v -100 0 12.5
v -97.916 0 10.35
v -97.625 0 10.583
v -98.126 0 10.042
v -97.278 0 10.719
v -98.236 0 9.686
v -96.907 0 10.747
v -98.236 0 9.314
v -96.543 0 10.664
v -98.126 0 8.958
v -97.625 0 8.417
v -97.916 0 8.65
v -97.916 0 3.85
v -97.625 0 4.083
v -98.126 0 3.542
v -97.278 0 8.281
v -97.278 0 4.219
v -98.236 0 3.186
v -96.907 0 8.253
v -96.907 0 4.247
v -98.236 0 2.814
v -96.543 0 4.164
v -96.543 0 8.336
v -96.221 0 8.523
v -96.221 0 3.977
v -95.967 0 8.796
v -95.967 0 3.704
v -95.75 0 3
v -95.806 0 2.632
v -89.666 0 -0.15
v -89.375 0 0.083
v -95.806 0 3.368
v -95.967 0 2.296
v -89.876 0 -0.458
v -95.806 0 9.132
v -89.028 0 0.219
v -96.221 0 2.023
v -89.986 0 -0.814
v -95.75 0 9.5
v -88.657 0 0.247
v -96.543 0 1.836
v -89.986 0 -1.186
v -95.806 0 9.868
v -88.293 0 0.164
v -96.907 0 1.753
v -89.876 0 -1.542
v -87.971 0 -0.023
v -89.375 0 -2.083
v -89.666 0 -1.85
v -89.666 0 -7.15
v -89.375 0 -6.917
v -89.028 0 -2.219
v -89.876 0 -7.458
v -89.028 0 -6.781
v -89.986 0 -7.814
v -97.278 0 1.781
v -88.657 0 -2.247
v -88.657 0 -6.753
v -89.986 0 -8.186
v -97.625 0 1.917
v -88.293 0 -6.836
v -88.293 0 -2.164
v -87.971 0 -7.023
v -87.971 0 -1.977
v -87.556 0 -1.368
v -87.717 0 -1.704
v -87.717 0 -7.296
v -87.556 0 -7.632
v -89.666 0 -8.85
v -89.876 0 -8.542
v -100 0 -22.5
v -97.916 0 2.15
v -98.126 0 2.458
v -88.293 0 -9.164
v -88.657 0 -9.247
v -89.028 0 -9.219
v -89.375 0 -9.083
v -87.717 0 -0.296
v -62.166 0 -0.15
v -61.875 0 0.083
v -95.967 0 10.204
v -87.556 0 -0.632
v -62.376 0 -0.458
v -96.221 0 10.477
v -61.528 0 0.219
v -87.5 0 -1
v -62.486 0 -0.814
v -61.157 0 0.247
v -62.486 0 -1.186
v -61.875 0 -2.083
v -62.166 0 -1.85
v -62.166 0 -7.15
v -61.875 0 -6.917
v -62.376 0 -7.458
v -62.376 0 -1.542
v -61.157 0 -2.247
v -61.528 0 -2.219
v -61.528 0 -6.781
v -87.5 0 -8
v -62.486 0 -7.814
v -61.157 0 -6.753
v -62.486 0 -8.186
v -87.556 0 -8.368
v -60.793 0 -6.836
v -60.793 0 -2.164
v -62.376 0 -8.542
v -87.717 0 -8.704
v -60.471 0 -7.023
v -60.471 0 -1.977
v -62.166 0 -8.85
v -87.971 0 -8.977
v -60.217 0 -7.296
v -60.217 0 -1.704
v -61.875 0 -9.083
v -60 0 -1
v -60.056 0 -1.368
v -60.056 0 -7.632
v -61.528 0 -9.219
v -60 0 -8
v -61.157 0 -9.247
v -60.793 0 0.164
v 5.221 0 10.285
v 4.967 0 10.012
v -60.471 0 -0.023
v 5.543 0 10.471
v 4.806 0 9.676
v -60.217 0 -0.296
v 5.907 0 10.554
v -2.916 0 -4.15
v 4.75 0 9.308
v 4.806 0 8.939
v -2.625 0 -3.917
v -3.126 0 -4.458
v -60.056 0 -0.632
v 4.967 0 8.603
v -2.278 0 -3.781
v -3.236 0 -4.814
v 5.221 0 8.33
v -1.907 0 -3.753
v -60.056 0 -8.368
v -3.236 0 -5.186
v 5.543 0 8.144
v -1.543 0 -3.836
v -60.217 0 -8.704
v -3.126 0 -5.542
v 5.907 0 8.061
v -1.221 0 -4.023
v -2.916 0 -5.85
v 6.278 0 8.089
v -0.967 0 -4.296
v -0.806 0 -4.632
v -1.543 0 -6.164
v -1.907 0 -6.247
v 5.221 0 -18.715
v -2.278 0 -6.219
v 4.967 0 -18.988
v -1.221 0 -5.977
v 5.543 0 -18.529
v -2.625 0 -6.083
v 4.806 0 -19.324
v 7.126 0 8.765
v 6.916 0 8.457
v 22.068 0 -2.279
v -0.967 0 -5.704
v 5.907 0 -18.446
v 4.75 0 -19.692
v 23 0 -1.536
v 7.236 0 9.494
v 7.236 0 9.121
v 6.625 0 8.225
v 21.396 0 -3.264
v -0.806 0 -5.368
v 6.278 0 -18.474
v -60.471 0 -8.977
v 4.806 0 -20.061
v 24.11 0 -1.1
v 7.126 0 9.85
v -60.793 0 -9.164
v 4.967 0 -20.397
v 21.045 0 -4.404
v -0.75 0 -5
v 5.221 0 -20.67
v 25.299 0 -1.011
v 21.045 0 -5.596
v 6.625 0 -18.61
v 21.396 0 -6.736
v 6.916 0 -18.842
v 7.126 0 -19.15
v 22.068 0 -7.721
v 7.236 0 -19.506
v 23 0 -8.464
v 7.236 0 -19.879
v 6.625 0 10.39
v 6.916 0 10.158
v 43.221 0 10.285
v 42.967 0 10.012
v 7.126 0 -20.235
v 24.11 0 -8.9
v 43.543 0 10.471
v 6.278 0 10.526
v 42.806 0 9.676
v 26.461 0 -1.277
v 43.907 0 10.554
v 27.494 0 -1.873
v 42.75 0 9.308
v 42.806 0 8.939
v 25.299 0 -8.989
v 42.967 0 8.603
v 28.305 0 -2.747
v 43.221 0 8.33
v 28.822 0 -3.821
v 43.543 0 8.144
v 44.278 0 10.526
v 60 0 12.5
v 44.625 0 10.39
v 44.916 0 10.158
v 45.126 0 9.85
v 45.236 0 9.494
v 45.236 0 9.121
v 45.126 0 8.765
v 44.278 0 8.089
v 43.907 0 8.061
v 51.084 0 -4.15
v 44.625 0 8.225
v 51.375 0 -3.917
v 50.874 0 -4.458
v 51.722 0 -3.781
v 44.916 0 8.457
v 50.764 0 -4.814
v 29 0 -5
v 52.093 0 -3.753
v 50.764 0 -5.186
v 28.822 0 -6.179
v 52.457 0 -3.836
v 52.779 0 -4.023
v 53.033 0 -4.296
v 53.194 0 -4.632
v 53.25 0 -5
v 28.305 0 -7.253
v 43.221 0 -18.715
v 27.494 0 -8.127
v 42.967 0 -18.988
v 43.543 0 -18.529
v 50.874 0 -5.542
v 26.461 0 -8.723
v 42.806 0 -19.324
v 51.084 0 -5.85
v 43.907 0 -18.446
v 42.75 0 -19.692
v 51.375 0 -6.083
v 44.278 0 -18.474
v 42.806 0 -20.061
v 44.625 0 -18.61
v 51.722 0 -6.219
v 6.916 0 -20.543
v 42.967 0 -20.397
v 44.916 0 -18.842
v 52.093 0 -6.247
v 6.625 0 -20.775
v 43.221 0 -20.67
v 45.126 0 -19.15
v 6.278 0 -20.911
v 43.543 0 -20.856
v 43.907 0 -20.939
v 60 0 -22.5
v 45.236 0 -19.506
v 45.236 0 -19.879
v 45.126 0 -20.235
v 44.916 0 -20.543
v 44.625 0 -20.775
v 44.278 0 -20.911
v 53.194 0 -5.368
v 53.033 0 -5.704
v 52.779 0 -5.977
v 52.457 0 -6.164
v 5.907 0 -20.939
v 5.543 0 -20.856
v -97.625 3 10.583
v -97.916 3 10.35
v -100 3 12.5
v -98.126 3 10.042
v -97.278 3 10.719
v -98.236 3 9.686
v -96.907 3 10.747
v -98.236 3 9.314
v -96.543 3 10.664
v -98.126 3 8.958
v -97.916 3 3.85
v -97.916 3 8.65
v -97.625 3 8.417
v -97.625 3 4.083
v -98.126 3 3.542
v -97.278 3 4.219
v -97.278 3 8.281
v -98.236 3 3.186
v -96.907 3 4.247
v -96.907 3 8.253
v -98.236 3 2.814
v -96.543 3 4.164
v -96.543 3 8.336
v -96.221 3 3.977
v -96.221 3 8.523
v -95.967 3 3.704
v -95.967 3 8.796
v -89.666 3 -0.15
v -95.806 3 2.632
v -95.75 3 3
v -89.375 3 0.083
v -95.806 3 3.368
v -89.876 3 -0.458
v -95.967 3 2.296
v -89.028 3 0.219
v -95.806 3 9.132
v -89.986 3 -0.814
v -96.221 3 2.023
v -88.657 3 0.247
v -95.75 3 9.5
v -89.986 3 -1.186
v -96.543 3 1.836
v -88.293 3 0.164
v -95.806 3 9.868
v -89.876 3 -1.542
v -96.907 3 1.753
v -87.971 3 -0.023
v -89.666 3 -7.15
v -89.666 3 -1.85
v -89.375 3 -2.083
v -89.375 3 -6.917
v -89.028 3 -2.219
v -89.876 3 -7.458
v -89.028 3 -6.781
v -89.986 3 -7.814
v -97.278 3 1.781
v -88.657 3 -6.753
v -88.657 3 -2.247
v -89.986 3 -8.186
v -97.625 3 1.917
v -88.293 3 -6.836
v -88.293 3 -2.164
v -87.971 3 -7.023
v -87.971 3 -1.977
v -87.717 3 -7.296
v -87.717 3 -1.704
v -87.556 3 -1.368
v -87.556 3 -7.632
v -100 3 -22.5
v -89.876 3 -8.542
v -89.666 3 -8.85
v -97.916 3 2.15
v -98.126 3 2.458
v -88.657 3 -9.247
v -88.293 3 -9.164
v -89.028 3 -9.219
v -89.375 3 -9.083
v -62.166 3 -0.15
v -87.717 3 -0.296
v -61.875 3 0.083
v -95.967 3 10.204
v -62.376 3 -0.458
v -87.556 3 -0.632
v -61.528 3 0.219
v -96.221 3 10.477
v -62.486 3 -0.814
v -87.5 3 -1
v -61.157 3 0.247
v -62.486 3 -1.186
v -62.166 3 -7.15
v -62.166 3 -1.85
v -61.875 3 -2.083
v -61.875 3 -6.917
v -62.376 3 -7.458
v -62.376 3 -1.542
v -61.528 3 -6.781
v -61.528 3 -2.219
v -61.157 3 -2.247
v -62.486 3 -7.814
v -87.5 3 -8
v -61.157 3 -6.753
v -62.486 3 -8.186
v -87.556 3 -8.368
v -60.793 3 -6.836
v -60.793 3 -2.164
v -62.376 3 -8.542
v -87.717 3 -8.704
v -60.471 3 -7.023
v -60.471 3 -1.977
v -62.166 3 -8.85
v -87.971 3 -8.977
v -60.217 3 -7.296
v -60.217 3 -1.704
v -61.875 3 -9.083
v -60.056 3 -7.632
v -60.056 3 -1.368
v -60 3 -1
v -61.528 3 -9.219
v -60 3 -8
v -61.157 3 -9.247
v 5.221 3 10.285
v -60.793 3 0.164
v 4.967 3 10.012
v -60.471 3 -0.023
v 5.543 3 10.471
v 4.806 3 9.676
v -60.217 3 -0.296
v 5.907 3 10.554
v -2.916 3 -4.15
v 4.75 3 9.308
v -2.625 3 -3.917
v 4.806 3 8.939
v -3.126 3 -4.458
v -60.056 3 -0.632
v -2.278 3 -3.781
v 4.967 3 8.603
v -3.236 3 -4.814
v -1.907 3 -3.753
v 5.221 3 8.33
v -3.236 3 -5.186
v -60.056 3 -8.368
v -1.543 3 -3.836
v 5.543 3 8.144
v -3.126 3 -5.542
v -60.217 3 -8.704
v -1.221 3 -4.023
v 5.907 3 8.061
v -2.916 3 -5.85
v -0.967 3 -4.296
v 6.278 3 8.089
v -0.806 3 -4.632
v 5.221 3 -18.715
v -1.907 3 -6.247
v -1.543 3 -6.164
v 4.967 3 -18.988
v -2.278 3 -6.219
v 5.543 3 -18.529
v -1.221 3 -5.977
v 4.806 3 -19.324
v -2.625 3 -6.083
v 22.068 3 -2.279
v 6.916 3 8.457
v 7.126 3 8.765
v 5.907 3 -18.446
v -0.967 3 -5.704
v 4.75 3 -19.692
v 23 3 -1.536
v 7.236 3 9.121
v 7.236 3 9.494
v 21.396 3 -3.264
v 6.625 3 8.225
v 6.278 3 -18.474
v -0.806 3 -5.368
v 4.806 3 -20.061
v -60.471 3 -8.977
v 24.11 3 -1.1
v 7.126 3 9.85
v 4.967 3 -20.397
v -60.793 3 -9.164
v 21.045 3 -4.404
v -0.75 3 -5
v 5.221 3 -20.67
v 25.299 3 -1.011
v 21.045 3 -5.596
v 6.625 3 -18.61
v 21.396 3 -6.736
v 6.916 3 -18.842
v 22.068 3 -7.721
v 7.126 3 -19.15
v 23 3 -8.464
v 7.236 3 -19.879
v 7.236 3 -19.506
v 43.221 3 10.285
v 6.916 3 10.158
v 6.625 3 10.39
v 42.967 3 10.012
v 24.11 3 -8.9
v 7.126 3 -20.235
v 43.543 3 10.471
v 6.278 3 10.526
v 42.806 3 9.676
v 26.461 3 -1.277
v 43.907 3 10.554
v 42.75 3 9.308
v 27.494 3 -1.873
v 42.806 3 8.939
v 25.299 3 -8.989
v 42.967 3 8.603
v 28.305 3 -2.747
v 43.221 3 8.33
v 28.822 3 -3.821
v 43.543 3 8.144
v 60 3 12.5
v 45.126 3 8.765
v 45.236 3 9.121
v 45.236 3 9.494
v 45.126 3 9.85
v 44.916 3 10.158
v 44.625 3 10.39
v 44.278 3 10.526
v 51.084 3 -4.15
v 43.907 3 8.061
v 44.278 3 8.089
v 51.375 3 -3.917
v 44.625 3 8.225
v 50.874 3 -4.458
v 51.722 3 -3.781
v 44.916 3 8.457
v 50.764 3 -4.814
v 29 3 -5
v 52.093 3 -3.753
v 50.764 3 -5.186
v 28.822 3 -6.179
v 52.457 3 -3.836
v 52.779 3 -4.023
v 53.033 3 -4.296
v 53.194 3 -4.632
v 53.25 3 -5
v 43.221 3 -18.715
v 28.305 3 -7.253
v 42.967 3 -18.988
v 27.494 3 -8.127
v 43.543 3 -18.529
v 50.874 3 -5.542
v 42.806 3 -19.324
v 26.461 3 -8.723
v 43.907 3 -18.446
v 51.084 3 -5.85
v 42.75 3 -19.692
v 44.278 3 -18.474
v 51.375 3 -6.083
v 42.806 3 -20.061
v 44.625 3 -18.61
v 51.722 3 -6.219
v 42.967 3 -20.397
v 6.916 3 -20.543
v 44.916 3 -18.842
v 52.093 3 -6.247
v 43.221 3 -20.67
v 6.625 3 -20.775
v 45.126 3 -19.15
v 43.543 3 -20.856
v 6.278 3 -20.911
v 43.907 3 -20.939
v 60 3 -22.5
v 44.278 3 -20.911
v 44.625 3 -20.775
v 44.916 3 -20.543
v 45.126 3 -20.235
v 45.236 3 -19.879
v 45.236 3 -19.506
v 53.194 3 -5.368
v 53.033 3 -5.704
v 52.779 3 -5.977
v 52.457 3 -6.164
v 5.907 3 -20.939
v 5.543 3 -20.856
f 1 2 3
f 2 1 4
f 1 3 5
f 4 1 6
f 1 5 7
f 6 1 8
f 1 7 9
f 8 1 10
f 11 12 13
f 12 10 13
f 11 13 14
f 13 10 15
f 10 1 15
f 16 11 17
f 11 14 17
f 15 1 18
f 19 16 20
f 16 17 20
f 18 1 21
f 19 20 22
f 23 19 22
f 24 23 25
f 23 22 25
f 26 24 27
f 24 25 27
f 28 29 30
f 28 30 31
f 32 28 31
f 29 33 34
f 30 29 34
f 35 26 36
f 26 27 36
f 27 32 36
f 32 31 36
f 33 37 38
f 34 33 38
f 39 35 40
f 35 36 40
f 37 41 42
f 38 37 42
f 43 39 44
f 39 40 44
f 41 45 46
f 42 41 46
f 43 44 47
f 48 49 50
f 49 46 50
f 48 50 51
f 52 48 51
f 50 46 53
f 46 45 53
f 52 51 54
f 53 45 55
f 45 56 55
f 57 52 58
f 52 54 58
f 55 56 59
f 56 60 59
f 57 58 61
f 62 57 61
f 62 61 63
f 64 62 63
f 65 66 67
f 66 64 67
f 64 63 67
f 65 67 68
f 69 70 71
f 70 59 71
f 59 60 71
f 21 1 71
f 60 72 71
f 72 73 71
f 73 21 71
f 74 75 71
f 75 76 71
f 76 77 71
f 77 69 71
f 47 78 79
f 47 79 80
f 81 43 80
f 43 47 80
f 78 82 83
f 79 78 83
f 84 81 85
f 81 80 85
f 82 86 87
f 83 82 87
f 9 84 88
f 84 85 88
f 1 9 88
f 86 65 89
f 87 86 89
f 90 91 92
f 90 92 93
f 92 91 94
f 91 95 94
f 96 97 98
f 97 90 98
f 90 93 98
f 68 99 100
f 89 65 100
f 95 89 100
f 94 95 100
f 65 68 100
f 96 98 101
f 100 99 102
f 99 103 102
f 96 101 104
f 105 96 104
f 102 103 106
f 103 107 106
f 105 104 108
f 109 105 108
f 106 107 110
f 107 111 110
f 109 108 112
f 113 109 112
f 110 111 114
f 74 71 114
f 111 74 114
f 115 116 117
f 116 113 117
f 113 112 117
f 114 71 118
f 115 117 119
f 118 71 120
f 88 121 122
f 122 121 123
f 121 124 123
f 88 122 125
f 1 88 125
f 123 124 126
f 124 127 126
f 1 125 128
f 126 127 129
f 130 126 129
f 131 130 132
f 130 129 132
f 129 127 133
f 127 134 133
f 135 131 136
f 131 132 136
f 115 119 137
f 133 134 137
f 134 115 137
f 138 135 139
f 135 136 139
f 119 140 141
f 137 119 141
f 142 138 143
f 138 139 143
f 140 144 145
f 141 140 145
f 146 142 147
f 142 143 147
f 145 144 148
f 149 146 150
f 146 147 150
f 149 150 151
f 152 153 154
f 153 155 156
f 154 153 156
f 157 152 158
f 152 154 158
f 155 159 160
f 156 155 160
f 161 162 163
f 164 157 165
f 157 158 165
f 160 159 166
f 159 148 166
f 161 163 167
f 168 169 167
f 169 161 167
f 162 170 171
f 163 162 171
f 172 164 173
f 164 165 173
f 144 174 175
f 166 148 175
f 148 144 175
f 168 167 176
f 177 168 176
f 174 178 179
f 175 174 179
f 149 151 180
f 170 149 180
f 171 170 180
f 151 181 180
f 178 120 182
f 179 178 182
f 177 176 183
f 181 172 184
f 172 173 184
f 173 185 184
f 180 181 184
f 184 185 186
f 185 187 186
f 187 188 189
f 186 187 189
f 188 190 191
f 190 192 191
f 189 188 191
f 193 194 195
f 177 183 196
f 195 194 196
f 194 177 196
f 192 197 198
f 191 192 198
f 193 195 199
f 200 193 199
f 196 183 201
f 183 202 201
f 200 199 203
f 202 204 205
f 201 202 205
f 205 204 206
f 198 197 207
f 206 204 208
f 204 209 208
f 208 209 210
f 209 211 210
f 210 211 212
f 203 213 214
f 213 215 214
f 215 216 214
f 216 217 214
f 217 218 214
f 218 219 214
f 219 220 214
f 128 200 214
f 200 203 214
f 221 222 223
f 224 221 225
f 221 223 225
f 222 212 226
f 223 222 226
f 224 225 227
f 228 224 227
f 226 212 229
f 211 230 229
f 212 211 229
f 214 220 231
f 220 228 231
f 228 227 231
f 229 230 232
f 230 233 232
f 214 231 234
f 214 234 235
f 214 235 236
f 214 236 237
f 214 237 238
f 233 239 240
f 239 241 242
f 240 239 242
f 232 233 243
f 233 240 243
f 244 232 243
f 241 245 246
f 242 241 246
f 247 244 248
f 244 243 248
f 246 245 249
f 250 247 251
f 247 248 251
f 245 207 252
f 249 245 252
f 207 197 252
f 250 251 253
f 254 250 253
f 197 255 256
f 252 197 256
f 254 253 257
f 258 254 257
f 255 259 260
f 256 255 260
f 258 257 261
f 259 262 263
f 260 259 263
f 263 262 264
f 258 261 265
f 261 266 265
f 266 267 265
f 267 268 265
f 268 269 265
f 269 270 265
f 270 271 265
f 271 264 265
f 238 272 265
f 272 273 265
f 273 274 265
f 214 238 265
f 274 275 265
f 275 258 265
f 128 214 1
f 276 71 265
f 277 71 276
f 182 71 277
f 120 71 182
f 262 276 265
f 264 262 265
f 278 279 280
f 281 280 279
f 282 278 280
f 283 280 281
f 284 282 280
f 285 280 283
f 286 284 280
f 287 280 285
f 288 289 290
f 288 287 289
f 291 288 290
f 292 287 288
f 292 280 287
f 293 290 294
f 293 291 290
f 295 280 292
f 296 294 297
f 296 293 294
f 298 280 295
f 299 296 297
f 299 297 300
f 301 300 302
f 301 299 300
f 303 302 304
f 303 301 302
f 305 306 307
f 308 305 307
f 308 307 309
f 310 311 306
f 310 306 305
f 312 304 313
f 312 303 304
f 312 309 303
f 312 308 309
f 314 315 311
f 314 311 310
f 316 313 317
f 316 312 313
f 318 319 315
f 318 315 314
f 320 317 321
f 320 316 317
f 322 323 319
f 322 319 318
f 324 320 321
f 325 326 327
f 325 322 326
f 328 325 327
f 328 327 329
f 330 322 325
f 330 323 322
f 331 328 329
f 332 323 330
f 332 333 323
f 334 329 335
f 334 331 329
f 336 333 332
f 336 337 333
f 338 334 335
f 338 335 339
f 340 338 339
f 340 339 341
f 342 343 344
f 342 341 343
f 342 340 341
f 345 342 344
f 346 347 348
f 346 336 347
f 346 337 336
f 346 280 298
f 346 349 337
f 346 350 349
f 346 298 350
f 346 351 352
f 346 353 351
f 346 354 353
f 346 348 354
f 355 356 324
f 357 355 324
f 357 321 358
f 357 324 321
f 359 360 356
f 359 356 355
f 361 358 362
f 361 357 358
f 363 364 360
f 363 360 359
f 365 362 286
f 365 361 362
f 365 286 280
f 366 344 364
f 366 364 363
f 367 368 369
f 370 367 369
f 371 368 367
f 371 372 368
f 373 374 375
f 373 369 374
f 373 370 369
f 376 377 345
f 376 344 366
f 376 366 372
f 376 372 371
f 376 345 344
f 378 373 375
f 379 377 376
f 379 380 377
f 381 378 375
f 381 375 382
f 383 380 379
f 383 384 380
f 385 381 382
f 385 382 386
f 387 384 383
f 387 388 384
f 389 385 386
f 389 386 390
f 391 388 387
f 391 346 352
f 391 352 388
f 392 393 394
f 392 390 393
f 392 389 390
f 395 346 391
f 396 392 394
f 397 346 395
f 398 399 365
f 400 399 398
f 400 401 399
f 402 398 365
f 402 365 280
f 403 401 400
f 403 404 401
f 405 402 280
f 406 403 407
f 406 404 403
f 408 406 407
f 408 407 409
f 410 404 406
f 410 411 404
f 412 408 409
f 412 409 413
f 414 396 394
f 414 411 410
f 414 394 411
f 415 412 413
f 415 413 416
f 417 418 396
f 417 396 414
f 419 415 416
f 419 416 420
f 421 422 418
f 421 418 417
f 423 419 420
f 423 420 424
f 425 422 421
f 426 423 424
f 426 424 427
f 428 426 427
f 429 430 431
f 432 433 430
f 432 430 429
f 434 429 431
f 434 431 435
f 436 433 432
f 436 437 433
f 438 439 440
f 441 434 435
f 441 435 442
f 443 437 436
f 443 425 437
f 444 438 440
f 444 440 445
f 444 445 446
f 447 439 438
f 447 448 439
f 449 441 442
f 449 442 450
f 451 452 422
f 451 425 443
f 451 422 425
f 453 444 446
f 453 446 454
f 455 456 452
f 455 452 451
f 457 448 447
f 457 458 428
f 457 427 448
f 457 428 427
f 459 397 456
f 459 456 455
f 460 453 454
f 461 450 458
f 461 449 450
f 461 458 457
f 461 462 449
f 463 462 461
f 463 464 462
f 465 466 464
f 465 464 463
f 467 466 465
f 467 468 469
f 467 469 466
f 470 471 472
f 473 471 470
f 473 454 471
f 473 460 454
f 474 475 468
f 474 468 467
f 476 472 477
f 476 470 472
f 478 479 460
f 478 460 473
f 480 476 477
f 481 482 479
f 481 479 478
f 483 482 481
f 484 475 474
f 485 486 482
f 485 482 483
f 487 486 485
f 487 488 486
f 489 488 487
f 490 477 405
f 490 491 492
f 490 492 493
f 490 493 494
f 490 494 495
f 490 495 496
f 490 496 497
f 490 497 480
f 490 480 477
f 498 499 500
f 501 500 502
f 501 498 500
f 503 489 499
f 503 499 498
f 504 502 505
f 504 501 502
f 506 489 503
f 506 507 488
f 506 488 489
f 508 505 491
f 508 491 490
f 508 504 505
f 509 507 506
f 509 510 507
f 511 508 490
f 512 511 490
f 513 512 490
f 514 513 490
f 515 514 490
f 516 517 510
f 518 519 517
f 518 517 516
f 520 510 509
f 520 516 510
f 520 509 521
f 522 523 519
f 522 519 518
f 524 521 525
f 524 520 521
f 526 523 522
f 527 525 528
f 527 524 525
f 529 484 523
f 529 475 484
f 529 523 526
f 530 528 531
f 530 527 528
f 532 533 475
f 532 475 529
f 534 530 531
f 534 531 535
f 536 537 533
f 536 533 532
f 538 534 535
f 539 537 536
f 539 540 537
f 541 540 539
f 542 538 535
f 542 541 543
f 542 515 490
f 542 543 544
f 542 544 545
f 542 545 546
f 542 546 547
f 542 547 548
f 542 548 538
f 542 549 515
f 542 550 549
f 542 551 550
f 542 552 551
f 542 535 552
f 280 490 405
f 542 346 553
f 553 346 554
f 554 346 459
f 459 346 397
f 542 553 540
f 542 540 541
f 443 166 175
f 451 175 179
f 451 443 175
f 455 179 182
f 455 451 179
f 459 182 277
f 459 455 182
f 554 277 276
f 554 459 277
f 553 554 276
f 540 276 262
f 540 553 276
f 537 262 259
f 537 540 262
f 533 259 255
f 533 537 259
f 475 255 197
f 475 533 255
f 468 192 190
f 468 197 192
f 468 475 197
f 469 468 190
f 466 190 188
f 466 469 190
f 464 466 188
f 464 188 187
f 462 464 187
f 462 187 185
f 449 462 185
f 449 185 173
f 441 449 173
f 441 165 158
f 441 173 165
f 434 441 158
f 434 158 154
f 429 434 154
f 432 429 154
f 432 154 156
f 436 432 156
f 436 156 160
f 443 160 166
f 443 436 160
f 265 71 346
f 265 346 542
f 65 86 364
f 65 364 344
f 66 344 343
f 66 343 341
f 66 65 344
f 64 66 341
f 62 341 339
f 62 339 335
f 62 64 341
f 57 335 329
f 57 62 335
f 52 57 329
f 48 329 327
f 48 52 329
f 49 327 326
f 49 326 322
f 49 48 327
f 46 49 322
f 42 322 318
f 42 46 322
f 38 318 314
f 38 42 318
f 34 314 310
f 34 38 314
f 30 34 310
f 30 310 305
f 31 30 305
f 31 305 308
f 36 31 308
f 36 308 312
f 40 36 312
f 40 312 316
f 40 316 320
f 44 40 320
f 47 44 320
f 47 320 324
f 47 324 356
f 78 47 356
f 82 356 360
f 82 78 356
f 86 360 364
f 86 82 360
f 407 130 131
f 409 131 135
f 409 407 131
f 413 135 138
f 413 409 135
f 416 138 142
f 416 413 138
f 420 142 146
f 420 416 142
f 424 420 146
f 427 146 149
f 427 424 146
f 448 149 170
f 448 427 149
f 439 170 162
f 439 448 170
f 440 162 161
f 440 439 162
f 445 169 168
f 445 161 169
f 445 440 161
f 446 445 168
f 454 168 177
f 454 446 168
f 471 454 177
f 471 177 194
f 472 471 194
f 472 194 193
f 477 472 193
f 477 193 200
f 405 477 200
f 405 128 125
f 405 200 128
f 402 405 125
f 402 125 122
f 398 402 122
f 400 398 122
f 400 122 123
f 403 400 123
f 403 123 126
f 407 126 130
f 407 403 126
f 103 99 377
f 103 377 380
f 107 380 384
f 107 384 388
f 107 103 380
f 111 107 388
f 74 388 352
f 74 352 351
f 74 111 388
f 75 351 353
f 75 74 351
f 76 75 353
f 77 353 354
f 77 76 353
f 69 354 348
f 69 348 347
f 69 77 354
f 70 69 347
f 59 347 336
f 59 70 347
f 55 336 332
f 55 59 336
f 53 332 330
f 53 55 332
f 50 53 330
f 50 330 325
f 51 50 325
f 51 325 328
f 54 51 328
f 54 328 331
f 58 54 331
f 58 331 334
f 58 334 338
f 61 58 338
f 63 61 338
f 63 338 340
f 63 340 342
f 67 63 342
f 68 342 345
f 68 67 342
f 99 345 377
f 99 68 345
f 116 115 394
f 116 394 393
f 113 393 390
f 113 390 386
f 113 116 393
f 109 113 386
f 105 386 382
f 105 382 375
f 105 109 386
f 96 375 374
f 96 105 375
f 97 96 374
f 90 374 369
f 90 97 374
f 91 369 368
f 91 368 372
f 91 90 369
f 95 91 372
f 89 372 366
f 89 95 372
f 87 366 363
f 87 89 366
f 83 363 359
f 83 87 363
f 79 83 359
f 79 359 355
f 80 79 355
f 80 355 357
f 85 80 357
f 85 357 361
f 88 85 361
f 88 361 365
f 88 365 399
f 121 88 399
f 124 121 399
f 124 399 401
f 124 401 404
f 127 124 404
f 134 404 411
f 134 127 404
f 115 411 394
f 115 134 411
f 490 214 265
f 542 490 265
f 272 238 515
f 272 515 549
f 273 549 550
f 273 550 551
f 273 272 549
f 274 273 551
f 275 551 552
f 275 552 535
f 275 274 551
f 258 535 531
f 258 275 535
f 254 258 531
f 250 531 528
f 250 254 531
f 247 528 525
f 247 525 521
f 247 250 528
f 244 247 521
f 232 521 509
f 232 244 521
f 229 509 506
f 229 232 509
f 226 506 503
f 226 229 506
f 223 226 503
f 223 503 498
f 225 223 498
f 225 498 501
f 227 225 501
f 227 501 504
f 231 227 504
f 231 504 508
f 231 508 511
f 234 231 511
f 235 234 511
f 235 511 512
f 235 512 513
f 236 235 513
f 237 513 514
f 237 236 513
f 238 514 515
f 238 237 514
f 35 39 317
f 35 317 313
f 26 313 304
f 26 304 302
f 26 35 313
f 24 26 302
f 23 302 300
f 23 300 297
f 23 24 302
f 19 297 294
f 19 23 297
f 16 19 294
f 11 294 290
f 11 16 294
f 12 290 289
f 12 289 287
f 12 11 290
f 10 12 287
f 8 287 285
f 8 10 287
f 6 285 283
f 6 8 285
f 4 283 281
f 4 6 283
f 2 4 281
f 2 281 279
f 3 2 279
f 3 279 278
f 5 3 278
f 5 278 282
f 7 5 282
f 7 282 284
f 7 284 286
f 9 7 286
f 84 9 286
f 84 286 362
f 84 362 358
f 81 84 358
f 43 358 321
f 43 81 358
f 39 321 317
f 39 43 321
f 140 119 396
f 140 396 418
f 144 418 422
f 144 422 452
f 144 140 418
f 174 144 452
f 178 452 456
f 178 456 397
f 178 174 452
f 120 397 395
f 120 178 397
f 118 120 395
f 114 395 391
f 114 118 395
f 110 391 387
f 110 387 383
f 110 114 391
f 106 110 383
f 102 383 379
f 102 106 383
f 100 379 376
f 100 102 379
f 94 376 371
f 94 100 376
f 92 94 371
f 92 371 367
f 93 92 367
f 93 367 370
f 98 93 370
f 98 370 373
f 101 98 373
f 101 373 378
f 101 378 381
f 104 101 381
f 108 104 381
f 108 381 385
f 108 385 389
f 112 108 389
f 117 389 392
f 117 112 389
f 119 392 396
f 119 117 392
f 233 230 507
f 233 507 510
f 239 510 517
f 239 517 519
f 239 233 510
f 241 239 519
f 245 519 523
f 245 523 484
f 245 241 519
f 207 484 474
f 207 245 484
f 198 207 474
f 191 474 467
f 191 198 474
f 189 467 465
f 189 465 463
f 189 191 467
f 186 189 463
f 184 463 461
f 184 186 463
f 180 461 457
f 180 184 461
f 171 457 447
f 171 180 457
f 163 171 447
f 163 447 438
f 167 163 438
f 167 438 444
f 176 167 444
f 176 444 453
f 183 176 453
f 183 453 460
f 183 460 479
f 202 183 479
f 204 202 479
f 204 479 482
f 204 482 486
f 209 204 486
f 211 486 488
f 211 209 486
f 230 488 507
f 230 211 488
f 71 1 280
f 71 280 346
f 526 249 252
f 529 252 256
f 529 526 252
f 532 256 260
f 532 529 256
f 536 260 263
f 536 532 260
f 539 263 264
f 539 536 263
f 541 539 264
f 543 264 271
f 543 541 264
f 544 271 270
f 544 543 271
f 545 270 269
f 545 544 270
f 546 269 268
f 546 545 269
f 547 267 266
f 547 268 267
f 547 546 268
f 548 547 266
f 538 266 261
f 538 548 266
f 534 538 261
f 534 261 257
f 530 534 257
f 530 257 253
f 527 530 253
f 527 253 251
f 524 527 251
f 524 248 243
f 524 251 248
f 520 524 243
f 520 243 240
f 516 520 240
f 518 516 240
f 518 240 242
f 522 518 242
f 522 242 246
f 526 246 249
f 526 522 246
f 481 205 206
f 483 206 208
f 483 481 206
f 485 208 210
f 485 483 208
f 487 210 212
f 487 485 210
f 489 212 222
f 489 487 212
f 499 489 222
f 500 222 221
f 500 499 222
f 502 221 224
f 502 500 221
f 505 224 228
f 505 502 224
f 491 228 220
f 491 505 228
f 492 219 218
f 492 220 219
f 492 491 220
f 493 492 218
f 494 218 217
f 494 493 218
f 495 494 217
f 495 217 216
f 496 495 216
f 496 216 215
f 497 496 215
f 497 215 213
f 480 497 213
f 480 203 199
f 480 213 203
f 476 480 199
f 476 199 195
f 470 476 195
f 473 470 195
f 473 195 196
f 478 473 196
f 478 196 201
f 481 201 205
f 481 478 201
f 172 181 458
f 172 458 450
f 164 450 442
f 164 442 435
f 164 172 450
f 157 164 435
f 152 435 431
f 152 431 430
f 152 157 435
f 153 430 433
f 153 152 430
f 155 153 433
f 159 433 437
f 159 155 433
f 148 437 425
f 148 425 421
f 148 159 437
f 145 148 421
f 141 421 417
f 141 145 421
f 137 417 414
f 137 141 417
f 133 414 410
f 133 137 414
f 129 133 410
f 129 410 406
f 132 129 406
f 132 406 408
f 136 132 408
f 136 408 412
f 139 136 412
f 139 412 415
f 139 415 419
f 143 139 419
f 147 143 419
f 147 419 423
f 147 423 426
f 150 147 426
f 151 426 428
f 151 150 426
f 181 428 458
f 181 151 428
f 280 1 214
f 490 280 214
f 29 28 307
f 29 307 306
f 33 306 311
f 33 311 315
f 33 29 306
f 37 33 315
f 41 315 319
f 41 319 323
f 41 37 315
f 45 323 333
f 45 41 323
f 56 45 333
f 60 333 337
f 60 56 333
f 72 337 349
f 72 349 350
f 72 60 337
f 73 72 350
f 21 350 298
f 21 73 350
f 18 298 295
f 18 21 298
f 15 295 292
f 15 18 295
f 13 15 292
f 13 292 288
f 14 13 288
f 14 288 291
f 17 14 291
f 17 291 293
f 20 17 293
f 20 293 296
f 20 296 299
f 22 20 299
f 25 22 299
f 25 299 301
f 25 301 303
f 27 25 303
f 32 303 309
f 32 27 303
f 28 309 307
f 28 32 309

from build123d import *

# Parameters (mm, degrees)
SKETCH1_W           = 160
SKETCH1_H           = 35
SKETCH1_R           = 1.25
SKETCH1_R_2         = 4
BOSS_EXTRUDE1_DEPTH = 3
SKETCH3_R           = 1.25
CUT_EXTRUDE7_DEPTH  = 10


with BuildPart() as part:
    # Sketch1 → Boss-Extrude1 (new body)
    with BuildSketch(Plane(origin=(0, 0, 0), x_dir=(1, 0, 0), z_dir=(0, 1, 0))):
        with Locations((-20, 5)):
            Rectangle(SKETCH1_W, SKETCH1_H)
        with Locations((-97, -9.5)):
            Circle(SKETCH1_R, mode=Mode.SUBTRACT)
        with Locations((-97, -3)):
            Circle(SKETCH1_R, mode=Mode.SUBTRACT)
        with Locations((-88.75, 1)):
            Circle(SKETCH1_R, mode=Mode.SUBTRACT)
        with Locations((-61.25, 1)):
            Circle(SKETCH1_R, mode=Mode.SUBTRACT)
        with Locations((-88.75, 8)):
            Circle(SKETCH1_R, mode=Mode.SUBTRACT)
        with Locations((-61.25, 8)):
            Circle(SKETCH1_R, mode=Mode.SUBTRACT)
        with Locations((-2, 5)):
            Circle(SKETCH1_R, mode=Mode.SUBTRACT)
        with Locations((25, 5)):
            Circle(SKETCH1_R_2, mode=Mode.SUBTRACT)
        with Locations((52, 5)):
            Circle(SKETCH1_R, mode=Mode.SUBTRACT)
    extrude(amount=BOSS_EXTRUDE1_DEPTH)

    # Sketch3 → Cut-Extrude7 (cut)
    with BuildSketch(Plane(origin=(0, 3, 0), x_dir=(-1, 0, 0), z_dir=(0, -1, 0))):
        with Locations((-44, -9.307637977)):
            Circle(SKETCH3_R)
        with Locations((-44, 19.692362023)):
            Circle(SKETCH3_R)
        with Locations((-6, 19.692362023)):
            Circle(SKETCH3_R)
        with Locations((-6, -9.307637977)):
            Circle(SKETCH3_R)
    extrude(amount=CUT_EXTRUDE7_DEPTH, mode=Mode.SUBTRACT)


solid = part.part
